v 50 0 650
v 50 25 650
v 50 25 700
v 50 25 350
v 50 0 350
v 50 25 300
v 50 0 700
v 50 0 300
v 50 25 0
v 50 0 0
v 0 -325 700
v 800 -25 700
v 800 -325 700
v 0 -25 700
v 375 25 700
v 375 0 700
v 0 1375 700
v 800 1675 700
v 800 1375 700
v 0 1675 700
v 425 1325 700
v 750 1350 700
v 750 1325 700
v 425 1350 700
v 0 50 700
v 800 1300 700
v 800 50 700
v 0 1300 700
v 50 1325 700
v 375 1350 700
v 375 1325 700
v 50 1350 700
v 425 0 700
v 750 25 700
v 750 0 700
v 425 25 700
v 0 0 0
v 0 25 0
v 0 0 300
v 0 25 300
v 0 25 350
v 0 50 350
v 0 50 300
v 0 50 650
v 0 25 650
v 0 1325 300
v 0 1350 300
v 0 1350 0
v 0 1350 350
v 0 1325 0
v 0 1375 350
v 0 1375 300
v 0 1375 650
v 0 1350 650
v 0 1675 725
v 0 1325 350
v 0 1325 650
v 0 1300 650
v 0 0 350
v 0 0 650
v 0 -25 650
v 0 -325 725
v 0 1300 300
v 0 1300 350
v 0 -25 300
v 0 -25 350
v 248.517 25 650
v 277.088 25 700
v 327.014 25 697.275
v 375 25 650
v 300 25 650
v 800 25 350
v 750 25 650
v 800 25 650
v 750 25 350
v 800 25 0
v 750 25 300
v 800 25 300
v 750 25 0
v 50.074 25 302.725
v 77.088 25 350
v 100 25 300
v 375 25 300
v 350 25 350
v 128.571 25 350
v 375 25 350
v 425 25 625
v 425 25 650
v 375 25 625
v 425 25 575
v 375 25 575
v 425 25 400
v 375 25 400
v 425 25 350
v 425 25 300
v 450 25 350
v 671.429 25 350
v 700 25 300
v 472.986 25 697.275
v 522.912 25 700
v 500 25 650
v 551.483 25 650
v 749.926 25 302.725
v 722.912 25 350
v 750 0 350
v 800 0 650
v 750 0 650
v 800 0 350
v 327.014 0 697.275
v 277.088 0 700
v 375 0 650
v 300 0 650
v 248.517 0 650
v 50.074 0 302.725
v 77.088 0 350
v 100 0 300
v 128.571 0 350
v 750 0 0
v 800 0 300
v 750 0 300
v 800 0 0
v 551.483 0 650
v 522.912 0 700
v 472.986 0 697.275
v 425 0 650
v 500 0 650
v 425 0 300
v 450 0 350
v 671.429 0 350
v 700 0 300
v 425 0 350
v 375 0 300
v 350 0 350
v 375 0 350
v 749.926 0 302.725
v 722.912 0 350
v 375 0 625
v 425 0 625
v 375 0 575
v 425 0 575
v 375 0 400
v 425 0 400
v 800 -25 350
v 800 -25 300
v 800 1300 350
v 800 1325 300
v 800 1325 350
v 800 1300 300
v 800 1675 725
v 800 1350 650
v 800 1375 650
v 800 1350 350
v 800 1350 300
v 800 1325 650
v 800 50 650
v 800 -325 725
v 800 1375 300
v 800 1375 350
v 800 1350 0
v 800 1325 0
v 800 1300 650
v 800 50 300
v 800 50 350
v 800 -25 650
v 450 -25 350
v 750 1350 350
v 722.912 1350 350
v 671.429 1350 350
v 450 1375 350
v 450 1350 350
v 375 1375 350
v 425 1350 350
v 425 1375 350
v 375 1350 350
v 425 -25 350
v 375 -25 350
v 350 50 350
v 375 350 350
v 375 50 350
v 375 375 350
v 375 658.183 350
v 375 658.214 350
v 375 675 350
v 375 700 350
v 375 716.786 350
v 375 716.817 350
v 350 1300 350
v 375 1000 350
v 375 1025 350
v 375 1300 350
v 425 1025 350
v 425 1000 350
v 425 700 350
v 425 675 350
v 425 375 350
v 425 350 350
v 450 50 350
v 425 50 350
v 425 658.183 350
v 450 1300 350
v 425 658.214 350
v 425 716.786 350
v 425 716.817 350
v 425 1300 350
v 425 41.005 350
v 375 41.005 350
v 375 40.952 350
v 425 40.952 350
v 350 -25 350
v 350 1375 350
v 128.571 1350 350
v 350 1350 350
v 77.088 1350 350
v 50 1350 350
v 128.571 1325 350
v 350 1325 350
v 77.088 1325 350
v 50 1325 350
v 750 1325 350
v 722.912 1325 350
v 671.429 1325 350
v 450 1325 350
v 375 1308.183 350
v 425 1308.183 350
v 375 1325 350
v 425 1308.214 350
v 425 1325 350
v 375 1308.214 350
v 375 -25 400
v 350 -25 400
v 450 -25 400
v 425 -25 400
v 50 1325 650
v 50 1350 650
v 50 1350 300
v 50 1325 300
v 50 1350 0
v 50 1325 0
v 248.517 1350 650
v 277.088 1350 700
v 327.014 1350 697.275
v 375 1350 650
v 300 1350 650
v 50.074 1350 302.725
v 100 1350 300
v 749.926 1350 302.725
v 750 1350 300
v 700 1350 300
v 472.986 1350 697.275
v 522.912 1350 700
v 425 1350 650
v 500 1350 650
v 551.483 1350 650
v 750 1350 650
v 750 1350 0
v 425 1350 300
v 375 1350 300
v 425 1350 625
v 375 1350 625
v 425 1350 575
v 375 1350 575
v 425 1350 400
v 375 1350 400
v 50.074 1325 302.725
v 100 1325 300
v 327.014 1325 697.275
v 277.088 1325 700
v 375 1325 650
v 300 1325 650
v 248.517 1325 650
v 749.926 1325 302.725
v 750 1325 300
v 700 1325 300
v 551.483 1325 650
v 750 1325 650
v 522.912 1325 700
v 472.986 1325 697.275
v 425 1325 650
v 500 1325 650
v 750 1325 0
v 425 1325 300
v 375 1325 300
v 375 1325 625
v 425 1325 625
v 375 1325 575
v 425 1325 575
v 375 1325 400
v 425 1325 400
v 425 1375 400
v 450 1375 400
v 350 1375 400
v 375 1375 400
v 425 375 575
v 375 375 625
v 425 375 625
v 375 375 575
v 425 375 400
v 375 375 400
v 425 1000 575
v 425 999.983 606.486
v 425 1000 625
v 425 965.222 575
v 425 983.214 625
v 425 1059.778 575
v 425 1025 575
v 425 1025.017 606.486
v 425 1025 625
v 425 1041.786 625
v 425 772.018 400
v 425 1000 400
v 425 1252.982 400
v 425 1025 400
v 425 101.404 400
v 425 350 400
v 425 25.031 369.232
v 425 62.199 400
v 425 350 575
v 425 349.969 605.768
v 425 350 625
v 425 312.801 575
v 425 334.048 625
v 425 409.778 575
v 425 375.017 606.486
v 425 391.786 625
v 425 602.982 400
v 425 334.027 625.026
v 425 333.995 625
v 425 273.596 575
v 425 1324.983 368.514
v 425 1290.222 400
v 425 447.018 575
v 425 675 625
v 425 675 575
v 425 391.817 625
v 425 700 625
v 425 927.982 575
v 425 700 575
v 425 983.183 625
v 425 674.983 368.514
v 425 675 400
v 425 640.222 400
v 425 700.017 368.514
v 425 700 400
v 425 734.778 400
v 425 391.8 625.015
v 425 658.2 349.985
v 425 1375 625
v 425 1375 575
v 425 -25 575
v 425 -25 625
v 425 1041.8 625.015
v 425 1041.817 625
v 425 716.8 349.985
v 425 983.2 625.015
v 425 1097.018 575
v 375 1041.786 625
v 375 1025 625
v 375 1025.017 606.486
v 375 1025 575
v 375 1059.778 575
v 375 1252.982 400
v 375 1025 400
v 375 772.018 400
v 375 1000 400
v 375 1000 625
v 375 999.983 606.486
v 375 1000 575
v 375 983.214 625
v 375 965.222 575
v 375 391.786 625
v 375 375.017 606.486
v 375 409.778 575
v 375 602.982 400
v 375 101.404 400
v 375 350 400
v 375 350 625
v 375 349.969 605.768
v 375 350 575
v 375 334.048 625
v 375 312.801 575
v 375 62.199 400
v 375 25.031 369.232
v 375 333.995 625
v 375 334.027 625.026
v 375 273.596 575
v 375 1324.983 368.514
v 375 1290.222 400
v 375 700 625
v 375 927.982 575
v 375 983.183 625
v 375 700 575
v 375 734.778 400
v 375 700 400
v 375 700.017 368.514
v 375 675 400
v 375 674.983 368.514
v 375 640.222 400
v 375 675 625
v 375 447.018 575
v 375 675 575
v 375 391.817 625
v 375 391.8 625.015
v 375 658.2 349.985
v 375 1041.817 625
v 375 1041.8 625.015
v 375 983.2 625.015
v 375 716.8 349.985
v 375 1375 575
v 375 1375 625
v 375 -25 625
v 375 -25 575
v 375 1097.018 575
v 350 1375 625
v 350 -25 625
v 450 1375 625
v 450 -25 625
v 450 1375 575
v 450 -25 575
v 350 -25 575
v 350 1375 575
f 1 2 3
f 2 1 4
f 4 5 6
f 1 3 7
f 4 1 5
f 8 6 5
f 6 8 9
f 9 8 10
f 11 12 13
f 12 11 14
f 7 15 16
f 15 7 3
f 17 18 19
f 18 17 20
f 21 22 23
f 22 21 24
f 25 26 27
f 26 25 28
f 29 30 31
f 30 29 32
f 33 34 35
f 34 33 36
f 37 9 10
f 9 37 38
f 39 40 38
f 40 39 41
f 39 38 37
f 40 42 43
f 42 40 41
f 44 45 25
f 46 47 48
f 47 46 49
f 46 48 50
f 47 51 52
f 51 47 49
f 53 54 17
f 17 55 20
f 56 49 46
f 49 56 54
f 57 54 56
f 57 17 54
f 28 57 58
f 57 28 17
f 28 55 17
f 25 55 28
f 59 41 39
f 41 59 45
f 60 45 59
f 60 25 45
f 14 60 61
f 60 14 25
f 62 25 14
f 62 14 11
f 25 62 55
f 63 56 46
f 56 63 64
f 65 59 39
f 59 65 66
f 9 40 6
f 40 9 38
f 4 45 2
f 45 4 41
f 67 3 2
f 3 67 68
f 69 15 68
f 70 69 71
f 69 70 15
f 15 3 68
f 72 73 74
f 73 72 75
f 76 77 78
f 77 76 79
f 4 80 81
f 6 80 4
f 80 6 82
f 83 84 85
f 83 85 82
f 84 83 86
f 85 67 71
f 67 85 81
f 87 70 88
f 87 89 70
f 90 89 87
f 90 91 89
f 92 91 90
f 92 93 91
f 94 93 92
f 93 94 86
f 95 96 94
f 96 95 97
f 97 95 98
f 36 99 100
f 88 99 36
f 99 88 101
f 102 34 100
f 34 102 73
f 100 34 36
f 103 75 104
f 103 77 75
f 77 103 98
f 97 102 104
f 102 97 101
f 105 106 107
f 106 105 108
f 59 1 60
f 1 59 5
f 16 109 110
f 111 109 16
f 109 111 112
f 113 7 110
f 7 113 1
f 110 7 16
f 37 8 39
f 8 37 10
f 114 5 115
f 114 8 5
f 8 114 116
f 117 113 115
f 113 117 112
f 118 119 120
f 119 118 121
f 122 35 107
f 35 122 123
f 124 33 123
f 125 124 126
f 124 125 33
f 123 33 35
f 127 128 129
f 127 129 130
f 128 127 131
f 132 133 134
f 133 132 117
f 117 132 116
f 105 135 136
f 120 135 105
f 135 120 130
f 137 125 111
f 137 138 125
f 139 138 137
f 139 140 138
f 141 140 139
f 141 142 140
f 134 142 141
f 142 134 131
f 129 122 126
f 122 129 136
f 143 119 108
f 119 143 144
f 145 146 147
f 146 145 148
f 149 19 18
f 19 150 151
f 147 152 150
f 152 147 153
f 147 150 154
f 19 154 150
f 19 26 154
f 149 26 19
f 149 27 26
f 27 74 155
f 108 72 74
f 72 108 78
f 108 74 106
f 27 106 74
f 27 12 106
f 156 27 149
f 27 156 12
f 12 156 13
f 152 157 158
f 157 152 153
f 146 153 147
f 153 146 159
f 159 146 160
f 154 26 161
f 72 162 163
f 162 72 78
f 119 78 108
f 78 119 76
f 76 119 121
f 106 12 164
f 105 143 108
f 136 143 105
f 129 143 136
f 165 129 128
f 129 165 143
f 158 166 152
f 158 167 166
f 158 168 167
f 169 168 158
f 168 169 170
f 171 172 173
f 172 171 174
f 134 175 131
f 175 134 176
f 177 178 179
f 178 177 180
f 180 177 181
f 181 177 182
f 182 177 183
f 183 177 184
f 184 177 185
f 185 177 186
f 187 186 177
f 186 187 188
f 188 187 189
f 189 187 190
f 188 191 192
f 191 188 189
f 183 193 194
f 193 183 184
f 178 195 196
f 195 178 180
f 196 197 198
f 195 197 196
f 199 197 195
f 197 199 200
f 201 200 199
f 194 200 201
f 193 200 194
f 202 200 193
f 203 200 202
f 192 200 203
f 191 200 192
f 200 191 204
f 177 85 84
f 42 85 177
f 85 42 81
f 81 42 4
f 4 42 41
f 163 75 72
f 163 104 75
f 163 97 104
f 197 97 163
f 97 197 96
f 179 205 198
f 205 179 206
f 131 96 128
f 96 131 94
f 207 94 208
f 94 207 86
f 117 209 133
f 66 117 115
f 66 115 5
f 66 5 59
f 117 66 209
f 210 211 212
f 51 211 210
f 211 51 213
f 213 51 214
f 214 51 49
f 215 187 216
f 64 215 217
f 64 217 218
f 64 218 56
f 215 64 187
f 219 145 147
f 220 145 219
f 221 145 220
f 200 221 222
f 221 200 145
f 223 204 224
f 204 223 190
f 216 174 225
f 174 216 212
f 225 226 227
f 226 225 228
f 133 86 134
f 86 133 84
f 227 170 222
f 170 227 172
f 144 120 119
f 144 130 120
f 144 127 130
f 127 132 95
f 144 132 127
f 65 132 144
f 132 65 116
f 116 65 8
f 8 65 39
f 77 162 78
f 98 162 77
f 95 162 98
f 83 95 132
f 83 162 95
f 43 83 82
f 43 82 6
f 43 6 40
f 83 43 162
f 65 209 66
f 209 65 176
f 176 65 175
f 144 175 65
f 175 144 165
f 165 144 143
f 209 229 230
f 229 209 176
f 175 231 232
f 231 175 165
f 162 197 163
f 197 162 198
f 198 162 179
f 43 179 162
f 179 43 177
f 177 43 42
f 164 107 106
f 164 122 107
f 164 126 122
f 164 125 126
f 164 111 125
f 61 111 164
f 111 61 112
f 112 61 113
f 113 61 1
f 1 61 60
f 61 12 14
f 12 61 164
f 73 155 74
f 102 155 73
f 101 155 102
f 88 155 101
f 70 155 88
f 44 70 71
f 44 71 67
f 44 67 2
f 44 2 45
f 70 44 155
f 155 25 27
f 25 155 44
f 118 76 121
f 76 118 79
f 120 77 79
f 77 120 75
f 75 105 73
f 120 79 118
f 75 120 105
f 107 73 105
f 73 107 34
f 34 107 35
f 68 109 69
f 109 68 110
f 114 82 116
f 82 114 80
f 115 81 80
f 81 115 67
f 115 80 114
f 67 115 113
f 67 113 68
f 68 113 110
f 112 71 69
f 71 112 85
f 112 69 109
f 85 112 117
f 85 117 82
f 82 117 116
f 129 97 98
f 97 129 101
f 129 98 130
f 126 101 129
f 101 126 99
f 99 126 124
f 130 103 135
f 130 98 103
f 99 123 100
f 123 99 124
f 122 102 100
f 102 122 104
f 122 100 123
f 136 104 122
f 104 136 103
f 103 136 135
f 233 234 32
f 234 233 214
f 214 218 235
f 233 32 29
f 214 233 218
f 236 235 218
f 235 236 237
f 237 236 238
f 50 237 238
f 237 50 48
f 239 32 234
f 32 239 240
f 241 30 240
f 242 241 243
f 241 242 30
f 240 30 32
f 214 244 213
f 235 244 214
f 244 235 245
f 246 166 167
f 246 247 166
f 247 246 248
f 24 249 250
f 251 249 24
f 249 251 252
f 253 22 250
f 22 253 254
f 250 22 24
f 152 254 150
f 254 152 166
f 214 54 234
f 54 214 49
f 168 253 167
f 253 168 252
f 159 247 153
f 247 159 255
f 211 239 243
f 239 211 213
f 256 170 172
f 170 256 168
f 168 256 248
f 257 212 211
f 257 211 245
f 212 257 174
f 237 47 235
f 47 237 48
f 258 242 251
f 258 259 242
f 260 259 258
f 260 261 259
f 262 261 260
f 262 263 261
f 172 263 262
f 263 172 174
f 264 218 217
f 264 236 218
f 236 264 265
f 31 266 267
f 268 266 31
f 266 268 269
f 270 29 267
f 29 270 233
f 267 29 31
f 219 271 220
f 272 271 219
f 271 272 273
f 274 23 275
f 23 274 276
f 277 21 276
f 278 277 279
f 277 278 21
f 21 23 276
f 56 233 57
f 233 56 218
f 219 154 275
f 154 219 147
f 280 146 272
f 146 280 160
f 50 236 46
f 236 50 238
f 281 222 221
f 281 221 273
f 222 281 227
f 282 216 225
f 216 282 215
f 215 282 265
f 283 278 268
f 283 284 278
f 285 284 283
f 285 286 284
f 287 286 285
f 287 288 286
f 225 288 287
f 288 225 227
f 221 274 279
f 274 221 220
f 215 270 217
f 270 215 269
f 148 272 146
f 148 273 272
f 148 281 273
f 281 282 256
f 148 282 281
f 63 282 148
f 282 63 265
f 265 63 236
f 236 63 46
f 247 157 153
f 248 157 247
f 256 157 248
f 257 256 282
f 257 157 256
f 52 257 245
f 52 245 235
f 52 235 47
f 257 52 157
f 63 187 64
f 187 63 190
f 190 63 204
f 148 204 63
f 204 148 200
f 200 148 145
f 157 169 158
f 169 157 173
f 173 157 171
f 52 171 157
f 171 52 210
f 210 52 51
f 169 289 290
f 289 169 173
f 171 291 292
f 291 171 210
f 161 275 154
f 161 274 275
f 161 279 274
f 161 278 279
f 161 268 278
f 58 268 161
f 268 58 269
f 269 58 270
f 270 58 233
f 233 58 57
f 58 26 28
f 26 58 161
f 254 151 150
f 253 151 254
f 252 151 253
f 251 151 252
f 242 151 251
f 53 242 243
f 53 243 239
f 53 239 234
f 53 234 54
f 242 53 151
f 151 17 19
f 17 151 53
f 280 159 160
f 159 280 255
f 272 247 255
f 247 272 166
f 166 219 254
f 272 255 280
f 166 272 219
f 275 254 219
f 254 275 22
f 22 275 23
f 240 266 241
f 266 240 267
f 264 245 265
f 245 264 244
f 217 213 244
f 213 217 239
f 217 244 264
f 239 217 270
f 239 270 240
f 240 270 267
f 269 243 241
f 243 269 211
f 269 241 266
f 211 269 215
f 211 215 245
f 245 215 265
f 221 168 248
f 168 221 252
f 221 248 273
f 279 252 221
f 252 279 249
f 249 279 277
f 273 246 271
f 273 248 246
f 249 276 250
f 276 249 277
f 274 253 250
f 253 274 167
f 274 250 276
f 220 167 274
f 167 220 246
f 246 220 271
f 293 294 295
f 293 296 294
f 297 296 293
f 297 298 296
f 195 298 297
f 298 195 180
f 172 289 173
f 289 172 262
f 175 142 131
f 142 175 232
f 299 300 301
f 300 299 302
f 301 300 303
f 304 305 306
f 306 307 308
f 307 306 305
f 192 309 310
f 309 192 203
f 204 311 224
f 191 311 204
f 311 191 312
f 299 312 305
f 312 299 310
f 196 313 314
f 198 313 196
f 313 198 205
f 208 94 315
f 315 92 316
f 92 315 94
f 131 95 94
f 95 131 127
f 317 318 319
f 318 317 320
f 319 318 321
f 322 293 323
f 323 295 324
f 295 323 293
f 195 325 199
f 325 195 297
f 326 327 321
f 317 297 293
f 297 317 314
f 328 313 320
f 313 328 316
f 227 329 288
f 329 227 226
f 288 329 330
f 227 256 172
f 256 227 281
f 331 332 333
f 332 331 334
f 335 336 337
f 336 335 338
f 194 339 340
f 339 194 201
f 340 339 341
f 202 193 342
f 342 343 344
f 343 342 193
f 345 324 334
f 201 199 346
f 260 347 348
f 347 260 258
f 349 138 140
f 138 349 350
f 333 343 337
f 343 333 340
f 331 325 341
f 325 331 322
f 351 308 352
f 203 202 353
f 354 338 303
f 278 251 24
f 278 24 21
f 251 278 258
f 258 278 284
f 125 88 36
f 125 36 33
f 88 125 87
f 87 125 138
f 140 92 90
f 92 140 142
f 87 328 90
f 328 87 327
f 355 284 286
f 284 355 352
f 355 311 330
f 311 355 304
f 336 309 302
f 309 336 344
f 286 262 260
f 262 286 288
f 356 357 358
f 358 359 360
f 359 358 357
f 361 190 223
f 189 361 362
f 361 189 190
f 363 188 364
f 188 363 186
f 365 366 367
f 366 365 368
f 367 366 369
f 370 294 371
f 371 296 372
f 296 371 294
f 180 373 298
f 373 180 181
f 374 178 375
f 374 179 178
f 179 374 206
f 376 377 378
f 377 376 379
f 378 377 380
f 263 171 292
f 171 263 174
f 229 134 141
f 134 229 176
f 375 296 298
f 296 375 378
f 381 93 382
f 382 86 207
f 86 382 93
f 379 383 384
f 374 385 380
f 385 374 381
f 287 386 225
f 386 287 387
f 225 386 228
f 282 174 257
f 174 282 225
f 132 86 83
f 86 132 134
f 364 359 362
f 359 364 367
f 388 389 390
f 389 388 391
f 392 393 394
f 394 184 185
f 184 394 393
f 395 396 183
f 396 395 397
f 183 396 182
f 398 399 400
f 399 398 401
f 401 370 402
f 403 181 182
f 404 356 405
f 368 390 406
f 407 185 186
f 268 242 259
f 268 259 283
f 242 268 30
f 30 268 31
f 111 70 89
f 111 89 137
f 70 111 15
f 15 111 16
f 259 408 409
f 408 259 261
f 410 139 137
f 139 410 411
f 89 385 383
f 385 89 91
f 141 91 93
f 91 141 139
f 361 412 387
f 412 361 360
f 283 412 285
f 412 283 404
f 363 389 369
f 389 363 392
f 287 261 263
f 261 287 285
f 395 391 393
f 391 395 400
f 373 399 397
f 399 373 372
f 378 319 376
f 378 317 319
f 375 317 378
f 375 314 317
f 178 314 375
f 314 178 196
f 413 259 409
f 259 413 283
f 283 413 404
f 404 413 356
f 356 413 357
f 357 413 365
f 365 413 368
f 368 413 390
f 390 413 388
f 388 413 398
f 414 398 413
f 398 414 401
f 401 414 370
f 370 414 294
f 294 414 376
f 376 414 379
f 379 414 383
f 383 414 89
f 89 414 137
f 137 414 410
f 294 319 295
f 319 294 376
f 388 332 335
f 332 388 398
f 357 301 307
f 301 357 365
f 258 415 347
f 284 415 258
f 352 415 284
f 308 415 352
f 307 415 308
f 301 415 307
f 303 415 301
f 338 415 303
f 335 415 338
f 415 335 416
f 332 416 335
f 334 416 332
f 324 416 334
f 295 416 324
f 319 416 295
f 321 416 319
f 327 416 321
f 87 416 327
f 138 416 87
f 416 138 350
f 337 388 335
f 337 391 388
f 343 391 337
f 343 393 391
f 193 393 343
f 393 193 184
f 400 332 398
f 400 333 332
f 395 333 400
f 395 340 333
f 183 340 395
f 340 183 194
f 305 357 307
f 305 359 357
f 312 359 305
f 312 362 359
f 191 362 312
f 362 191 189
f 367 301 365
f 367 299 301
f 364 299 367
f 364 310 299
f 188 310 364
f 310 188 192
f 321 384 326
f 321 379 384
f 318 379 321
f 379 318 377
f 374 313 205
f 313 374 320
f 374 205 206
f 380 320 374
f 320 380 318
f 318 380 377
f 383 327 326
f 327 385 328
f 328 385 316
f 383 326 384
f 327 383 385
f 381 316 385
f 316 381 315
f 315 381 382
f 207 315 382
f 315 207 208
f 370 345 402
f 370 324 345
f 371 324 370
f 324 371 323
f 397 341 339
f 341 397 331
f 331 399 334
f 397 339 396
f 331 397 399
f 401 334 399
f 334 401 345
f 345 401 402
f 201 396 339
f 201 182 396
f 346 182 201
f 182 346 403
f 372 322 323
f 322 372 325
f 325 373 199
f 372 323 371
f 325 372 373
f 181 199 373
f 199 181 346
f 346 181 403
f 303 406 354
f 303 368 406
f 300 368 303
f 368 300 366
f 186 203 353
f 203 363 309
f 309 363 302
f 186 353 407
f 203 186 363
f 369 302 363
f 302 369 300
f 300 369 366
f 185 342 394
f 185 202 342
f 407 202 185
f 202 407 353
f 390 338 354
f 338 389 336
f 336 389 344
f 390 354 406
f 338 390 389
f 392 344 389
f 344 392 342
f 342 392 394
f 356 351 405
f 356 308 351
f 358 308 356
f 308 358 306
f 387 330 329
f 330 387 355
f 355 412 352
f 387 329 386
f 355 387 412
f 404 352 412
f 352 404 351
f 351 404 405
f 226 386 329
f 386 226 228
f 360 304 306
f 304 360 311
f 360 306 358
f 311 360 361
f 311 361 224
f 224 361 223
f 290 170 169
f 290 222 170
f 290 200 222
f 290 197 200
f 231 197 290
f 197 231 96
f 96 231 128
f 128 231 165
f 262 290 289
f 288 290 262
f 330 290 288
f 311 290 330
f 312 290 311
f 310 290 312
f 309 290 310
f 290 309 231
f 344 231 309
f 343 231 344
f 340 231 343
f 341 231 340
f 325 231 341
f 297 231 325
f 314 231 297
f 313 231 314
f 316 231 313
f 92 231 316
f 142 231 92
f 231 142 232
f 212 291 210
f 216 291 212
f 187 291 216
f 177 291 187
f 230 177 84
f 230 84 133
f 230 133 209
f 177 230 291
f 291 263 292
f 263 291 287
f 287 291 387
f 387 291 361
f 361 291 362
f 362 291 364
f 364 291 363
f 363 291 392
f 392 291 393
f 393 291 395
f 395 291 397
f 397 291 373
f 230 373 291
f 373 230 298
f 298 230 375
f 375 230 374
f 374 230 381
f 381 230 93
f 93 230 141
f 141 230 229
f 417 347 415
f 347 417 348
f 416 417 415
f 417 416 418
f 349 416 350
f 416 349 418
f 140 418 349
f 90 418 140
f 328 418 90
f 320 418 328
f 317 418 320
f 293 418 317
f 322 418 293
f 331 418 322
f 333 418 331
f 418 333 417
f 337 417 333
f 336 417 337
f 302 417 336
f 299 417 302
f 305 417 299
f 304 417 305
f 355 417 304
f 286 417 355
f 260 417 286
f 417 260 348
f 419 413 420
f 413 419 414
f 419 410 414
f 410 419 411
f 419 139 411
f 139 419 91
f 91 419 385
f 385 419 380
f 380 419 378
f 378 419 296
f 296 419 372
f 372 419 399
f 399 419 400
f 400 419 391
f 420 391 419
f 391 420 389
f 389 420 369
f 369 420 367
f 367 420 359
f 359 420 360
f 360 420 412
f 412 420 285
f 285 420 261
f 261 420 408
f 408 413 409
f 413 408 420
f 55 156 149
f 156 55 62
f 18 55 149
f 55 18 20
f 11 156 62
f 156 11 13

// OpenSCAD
// Archiyou -> OpenSCAD  |  script: maritavolo  |  units: mm
// OpenSCAD has no units: coordinates are in mm.
// Parts: 45 CSG, 0 baked, 0 2D
// Skipped: diagLine (open curve), Curve:Line (open curve)
// Parameters at export, for reference only (nothing in this file is linked to them):
//   DEPTH = 80
//   LENGTH = 200
//   HEIGHT = 70
//   BEAM_WIDTH = 50
//   BEAM_THICKNESS = 25

$fn = 32;
PART = "";

// sideV  (layer sides)
module sideV() {
    color([1, 0, 0]) translate([25, 12.5, 350]) cube([50, 25, 700], center = true);
}

// sideH  (layer sides)
module sideH() {
    color([1, 0, 0]) translate([400, -12.5, 325]) cube([800, 25, 50], center = true);
}

// sideH  (layer sides)
module sideH_2() {
    color([1, 0, 0]) translate([400, 37.5, 325]) cube([800, 25, 50], center = true);
}

// sideH  (layer sides)
module sideH_3() {
    color([1, 0, 0]) translate([400, -12.5, 675]) cube([800, 25, 50], center = true);
}

// sideH  (layer sides)
module sideH_4() {
    color([1, 0, 0]) translate([400, 37.5, 675]) cube([800, 25, 50], center = true);
}

// sideV  (layer sides)
module sideV_2() {
    color([1, 0, 0]) multmatrix([[-1, 0, 0, 775], [0, 1, 0, 12.5], [0, 0, 1, 350], [0, 0, 0, 1]]) cube([50, 25, 700], center = true);
}

// sideD  (layer diagonalLeft)
module sideD() {
    color([1, 0, 0]) multmatrix([[0.496138938357, 0.868243142124, 0, 50.0743379767], [0, 0, 1, 0], [0.868243142124, -0.496138938357, 0, 302.72548556], [0, 0, 0, 1]]) linear_extrude(height = 25) polygon([[0, 0], [457.561361749, 0], [479.965042556, 44.69983318], [22.4036808065, 44.69983318]]);
}

// sideD  (layer diagonalLeft)
module sideD_2() {
    color([1, 0, 0]) multmatrix([[-0.496138938357, -0.868243142124, 0, 749.925662023], [0, 0, 1, 0], [0.868243142124, -0.496138938357, 0, 302.72548556], [0, 0, 0, 1]]) linear_extrude(height = 25) polygon([[0, 0], [457.561361749, 0], [479.965042556, 44.69983318], [22.4036808065, 44.69983318]]);
}

// sideV  (layer diagonalLeft)
module sideV_3() {
    color([1, 0, 0]) translate([25, 1337.5, 350]) cube([50, 25, 700], center = true);
}

// sideH  (layer diagonalLeft)
module sideH_5() {
    color([1, 0, 0]) translate([400, 1312.5, 325]) cube([800, 25, 50], center = true);
}

// sideH  (layer diagonalLeft)
module sideH_6() {
    color([1, 0, 0]) translate([400, 1362.5, 325]) cube([800, 25, 50], center = true);
}

// sideH  (layer diagonalLeft)
module sideH_7() {
    color([1, 0, 0]) translate([400, 1312.5, 675]) cube([800, 25, 50], center = true);
}

// sideH  (layer diagonalLeft)
module sideH_8() {
    color([1, 0, 0]) translate([400, 1362.5, 675]) cube([800, 25, 50], center = true);
}

// sideV  (layer diagonalLeft)
module sideV_4() {
    color([1, 0, 0]) multmatrix([[-1, 0, 0, 775], [0, 1, 0, 1337.5], [0, 0, 1, 350], [0, 0, 0, 1]]) cube([50, 25, 700], center = true);
}

// sideD  (layer diagonalLeft)
module sideD_3() {
    color([1, 0, 0]) multmatrix([[0.496138938357, 0.868243142124, 0, 50.0743379767], [0, 0, 1, 1325], [0.868243142124, -0.496138938357, 0, 302.72548556], [0, 0, 0, 1]]) linear_extrude(height = 25) polygon([[0, 0], [457.561361749, 0], [479.965042556, 44.69983318], [22.4036808065, 44.69983318]]);
}

// sideD  (layer diagonalLeft)
module sideD_4() {
    color([1, 0, 0]) multmatrix([[-0.496138938357, -0.868243142124, 0, 749.925662023], [0, 0, 1, 1325], [0.868243142124, -0.496138938357, 0, 302.72548556], [0, 0, 0, 1]]) linear_extrude(height = 25) polygon([[0, 0], [457.561361749, 0], [479.965042556, 44.69983318], [22.4036808065, 44.69983318]]);
}

// strut V mid  (layer spine)
module strut_V_mid() {
    color([0, 0.502, 0]) multmatrix([[0, 0, 1, 400], [1, 0, 0, 362.5], [0, 1, 0, 487.5], [0, 0, 0, 1]]) cube([25, 275, 50], center = true);
}

// strut V mid  (layer spine)
module strut_V_mid_2() {
    color([0, 0.502, 0]) multmatrix([[0, 0, 1, 400], [1, 0, 0, 687.5], [0, 1, 0, 487.5], [0, 0, 0, 1]]) cube([25, 275, 50], center = true);
}

// strut V mid  (layer spine)
module strut_V_mid_3() {
    color([0, 0.502, 0]) multmatrix([[0, 0, 1, 400], [1, 0, 0, 1012.5], [0, 1, 0, 487.5], [0, 0, 0, 1]]) cube([25, 275, 50], center = true);
}

// strutD  (layer spine)
module strutD() {
    color([0, 0.502, 0]) multmatrix([[0, 0, 1, 375], [0.770303524451, -0.637677410779, 0, 40.9732726305], [0.637677410779, 0.770303524451, 0, 349.973971939], [0, 0, 0, 1]]) linear_extrude(height = 50) polygon([[0, 0], [401.134592015, 0], [401.134592015, 25], [0, 25]]);
}

// strutD  (layer spine)
module strutD_2() {
    color([0, 0.502, 0]) multmatrix([[0, 0, 1, 375], [-0.741160470842, -0.671327905319, 0, 658.199991259], [0.671327905319, -0.741160470842, 0, 349.984745032], [0, 0, 0, 1]]) linear_extrude(height = 50) polygon([[0, 0], [382.080792609, 0], [382.080792609, -25], [0, -25]]);
}

// strutD  (layer spine)
module strutD_3() {
    color([0, 0.502, 0]) multmatrix([[0, 0, 1, 375], [0.741160470842, -0.671327905319, 0, 716.800008741], [0.671327905319, 0.741160470842, 0, 349.984745032], [0, 0, 0, 1]]) linear_extrude(height = 50) polygon([[0, 0], [382.080792609, 0], [382.080792609, 25], [0, 25]]);
}

// strutD  (layer spine)
module strutD_4() {
    color([0, 0.502, 0]) multmatrix([[0, 0, 1, 375], [-0.741160470842, -0.671327905319, 0, 1308.19999126], [0.671327905319, -0.741160470842, 0, 349.984745032], [0, 0, 0, 1]]) linear_extrude(height = 50) polygon([[0, 0], [382.080792609, 0], [382.080792609, -25], [0, -25]]);
}

// strutV ends  (layer spine)
module strutV_ends() {
    color([0, 0.502, 0]) multmatrix([[0, 0, 1, 400], [1, 0, 0, 12.5], [0, 1, 0, 500], [0, 0, 0, 1]]) cube([25, 400, 50], center = true);
}

// strutV ends  (layer spine)
module strutV_ends_2() {
    color([0, 0.502, 0]) multmatrix([[0, 0, 1, 400], [-1, 0, 0, 1337.5], [0, 1, 0, 500], [0, 0, 0, 1]]) cube([25, 400, 50], center = true);
}

// strutH  (layer spine)
module strutH() {
    color([0, 0.502, 0]) multmatrix([[0, 0, 1, 437.5], [1, 0, 0, 675], [0, 1, 0, 375], [0, 0, 0, 1]]) cube([1400, 50, 25], center = true);
}

// strutH  (layer spine)
module strutH_2() {
    color([0, 0.502, 0]) multmatrix([[0, 0, -1, 362.5], [1, 0, 0, 675], [0, 1, 0, 375], [0, 0, 0, 1]]) cube([1400, 50, 25], center = true);
}

// strutH  (layer spine)
module strutH_3() {
    color([0, 0.502, 0]) multmatrix([[0, 0, 1, 437.5], [1, 0, 0, 675], [0, -1, 0, 600], [0, 0, 0, 1]]) cube([1400, 50, 25], center = true);
}

// strutH  (layer spine)
module strutH_4() {
    color([0, 0.502, 0]) multmatrix([[0, 0, -1, 362.5], [1, 0, 0, 675], [0, -1, 0, 600], [0, 0, 0, 1]]) cube([1400, 50, 25], center = true);
}

// topPlank11  (layer tabletop)
module topPlank11() {
    color([0.647, 0.165, 0.165]) translate([25, 675, 712.5]) cube([50, 2000, 25], center = true);
}

// topPlank21  (layer tabletop)
module topPlank21() {
    color([0.647, 0.165, 0.165]) translate([75, 675, 712.5]) cube([50, 2000, 25], center = true);
}

// topPlank31  (layer tabletop)
module topPlank31() {
    color([0.647, 0.165, 0.165]) translate([125, 675, 712.5]) cube([50, 2000, 25], center = true);
}

// topPlank41  (layer tabletop)
module topPlank41() {
    color([0.647, 0.165, 0.165]) translate([175, 675, 712.5]) cube([50, 2000, 25], center = true);
}

// topPlank51  (layer tabletop)
module topPlank51() {
    color([0.647, 0.165, 0.165]) translate([225, 675, 712.5]) cube([50, 2000, 25], center = true);
}

// topPlank61  (layer tabletop)
module topPlank61() {
    color([0.647, 0.165, 0.165]) translate([275, 675, 712.5]) cube([50, 2000, 25], center = true);
}

// topPlank71  (layer tabletop)
module topPlank71() {
    color([0.647, 0.165, 0.165]) translate([325, 675, 712.5]) cube([50, 2000, 25], center = true);
}

// topPlank81  (layer tabletop)
module topPlank81() {
    color([0.647, 0.165, 0.165]) translate([375, 675, 712.5]) cube([50, 2000, 25], center = true);
}

// topPlank91  (layer tabletop)
module topPlank91() {
    color([0.647, 0.165, 0.165]) translate([425, 675, 712.5]) cube([50, 2000, 25], center = true);
}

// topPlank101  (layer tabletop)
module topPlank101() {
    color([0.647, 0.165, 0.165]) translate([475, 675, 712.5]) cube([50, 2000, 25], center = true);
}

// topPlank111  (layer tabletop)
module topPlank111() {
    color([0.647, 0.165, 0.165]) translate([525, 675, 712.5]) cube([50, 2000, 25], center = true);
}

// topPlank121  (layer tabletop)
module topPlank121() {
    color([0.647, 0.165, 0.165]) translate([575, 675, 712.5]) cube([50, 2000, 25], center = true);
}

// topPlank131  (layer tabletop)
module topPlank131() {
    color([0.647, 0.165, 0.165]) translate([625, 675, 712.5]) cube([50, 2000, 25], center = true);
}

// topPlank141  (layer tabletop)
module topPlank141() {
    color([0.647, 0.165, 0.165]) translate([675, 675, 712.5]) cube([50, 2000, 25], center = true);
}

// topPlank151  (layer tabletop)
module topPlank151() {
    color([0.647, 0.165, 0.165]) translate([725, 675, 712.5]) cube([50, 2000, 25], center = true);
}

// topPlank161  (layer tabletop)
module topPlank161() {
    color([0.647, 0.165, 0.165]) translate([775, 675, 712.5]) cube([50, 2000, 25], center = true);
}

// 3D parts
if (PART == "" || PART == "sideV") sideV();
if (PART == "" || PART == "sideH") sideH();
if (PART == "" || PART == "sideH_2") sideH_2();
if (PART == "" || PART == "sideH_3") sideH_3();
if (PART == "" || PART == "sideH_4") sideH_4();
if (PART == "" || PART == "sideV_2") sideV_2();
if (PART == "" || PART == "sideD") sideD();
if (PART == "" || PART == "sideD_2") sideD_2();
if (PART == "" || PART == "sideV_3") sideV_3();
if (PART == "" || PART == "sideH_5") sideH_5();
if (PART == "" || PART == "sideH_6") sideH_6();
if (PART == "" || PART == "sideH_7") sideH_7();
if (PART == "" || PART == "sideH_8") sideH_8();
if (PART == "" || PART == "sideV_4") sideV_4();
if (PART == "" || PART == "sideD_3") sideD_3();
if (PART == "" || PART == "sideD_4") sideD_4();
if (PART == "" || PART == "strut_V_mid") strut_V_mid();
if (PART == "" || PART == "strut_V_mid_2") strut_V_mid_2();
if (PART == "" || PART == "strut_V_mid_3") strut_V_mid_3();
if (PART == "" || PART == "strutD") strutD();
if (PART == "" || PART == "strutD_2") strutD_2();
if (PART == "" || PART == "strutD_3") strutD_3();
if (PART == "" || PART == "strutD_4") strutD_4();
if (PART == "" || PART == "strutV_ends") strutV_ends();
if (PART == "" || PART == "strutV_ends_2") strutV_ends_2();
if (PART == "" || PART == "strutH") strutH();
if (PART == "" || PART == "strutH_2") strutH_2();
if (PART == "" || PART == "strutH_3") strutH_3();
if (PART == "" || PART == "strutH_4") strutH_4();
if (PART == "" || PART == "topPlank11") topPlank11();
if (PART == "" || PART == "topPlank21") topPlank21();
if (PART == "" || PART == "topPlank31") topPlank31();
if (PART == "" || PART == "topPlank41") topPlank41();
if (PART == "" || PART == "topPlank51") topPlank51();
if (PART == "" || PART == "topPlank61") topPlank61();
if (PART == "" || PART == "topPlank71") topPlank71();
if (PART == "" || PART == "topPlank81") topPlank81();
if (PART == "" || PART == "topPlank91") topPlank91();
if (PART == "" || PART == "topPlank101") topPlank101();
if (PART == "" || PART == "topPlank111") topPlank111();
if (PART == "" || PART == "topPlank121") topPlank121();
if (PART == "" || PART == "topPlank131") topPlank131();
if (PART == "" || PART == "topPlank141") topPlank141();
if (PART == "" || PART == "topPlank151") topPlank151();
if (PART == "" || PART == "topPlank161") topPlank161();
